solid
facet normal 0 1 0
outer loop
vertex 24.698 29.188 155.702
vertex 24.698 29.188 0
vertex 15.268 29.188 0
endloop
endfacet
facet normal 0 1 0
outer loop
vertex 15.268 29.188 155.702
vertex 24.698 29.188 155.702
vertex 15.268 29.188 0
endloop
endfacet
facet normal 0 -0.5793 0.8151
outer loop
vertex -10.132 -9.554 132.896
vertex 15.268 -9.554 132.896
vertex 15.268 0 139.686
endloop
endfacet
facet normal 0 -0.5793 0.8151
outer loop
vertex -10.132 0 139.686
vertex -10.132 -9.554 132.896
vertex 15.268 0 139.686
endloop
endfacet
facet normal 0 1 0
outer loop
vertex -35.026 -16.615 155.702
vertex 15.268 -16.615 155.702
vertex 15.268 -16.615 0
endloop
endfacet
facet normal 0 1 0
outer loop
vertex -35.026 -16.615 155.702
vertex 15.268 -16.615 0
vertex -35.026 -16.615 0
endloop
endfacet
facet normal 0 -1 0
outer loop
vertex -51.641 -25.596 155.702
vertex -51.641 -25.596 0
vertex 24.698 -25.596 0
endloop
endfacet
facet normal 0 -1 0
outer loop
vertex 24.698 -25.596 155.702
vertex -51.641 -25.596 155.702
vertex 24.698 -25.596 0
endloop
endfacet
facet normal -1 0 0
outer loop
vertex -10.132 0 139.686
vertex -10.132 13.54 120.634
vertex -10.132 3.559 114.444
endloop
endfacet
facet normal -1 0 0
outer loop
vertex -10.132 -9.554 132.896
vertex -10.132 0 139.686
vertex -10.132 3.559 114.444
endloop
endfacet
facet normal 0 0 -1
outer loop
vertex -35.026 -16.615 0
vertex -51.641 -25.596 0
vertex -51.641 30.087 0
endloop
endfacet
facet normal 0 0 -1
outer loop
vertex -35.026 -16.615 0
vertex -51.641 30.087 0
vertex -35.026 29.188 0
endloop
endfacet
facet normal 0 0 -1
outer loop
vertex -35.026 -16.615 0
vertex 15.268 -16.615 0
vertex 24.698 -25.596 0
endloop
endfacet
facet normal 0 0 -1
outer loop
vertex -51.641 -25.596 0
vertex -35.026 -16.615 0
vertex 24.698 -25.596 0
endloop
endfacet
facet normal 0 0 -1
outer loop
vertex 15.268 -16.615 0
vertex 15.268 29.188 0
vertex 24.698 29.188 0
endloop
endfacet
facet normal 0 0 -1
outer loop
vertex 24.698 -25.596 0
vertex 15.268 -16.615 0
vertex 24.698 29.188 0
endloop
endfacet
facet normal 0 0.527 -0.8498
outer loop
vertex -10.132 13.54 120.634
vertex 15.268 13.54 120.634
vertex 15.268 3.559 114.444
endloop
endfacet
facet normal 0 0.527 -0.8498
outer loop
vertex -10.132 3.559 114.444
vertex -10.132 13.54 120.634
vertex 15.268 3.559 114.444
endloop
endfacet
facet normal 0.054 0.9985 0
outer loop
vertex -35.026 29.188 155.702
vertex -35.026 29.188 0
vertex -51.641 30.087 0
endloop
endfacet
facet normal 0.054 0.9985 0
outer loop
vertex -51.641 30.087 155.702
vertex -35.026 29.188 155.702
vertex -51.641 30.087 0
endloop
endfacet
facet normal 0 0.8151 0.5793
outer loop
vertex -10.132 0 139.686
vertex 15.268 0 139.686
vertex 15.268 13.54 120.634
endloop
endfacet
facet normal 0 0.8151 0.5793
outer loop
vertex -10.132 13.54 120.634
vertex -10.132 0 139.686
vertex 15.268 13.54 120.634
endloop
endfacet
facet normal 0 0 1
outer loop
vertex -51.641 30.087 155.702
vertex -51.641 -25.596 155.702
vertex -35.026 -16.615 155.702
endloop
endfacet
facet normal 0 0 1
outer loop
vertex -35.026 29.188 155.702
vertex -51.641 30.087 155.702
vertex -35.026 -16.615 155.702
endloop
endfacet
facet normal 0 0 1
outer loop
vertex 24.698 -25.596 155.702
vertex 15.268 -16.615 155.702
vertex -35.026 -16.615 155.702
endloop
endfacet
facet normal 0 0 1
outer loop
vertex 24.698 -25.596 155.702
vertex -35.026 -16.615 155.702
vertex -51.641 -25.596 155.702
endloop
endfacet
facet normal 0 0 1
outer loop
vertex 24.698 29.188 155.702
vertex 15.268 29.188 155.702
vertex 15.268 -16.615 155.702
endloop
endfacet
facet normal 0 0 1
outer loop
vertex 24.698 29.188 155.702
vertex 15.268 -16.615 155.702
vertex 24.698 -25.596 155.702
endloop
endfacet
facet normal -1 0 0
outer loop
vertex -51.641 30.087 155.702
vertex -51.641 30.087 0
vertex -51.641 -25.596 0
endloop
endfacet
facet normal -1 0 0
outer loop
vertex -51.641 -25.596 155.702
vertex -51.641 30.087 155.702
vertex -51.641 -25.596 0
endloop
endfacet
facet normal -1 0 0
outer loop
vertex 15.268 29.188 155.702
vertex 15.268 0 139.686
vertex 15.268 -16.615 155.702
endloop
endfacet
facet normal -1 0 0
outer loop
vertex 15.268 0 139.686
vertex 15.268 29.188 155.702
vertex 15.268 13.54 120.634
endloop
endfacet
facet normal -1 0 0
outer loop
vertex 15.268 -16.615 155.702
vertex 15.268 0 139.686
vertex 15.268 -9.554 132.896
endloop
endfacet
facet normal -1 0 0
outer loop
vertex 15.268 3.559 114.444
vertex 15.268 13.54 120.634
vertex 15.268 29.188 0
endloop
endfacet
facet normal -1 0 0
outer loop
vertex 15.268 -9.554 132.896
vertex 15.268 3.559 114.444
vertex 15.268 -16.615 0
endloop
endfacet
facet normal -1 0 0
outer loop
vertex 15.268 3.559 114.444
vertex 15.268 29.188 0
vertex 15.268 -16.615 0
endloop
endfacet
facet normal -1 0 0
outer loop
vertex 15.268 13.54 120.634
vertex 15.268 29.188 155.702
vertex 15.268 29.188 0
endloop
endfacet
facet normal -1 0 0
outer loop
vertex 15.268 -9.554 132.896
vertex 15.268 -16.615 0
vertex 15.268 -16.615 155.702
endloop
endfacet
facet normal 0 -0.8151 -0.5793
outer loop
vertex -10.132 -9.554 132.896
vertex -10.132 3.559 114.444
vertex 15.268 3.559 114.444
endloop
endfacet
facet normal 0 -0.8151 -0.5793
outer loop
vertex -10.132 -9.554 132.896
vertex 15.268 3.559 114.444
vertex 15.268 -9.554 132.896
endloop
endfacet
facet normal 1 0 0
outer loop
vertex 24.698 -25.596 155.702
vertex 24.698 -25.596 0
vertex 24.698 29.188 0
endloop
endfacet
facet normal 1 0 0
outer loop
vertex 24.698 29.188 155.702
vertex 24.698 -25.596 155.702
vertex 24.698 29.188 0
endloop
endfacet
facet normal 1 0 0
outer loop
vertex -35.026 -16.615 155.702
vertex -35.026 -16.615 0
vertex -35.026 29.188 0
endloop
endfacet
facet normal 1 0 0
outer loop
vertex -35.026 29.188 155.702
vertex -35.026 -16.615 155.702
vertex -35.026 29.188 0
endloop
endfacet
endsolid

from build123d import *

# Parameters (mm, degrees)
F1_DEPTH = 155.702
F3_DEPTH = 25.4


with BuildPart() as f1:
    # F0 (on Top) → F1 (new body)
    with BuildSketch(Plane.XY):
        Polygon((-35.026107, 29.188428), (-51.641054, 30.086534), (-51.641054, -25.595998), (24.6979, -25.595998), (24.6979, 29.188428), (15.267792, 29.188428), (15.267792, -16.614946), (-35.026107, -16.614946), align=None)
    extrude(amount=F1_DEPTH)

    # F2 (on face) → F3 (join)
    with BuildSketch(Plane(origin=(15.267792, 0, 0), x_dir=(0, -1, 0), z_dir=(-1, 0, 0))):
        Polygon((0, 139.685988), (-13.539952, 120.63428), (-3.559254, 114.443869), (9.554391, 132.895732), align=None)
    extrude(amount=F3_DEPTH)


solid = f1.part
